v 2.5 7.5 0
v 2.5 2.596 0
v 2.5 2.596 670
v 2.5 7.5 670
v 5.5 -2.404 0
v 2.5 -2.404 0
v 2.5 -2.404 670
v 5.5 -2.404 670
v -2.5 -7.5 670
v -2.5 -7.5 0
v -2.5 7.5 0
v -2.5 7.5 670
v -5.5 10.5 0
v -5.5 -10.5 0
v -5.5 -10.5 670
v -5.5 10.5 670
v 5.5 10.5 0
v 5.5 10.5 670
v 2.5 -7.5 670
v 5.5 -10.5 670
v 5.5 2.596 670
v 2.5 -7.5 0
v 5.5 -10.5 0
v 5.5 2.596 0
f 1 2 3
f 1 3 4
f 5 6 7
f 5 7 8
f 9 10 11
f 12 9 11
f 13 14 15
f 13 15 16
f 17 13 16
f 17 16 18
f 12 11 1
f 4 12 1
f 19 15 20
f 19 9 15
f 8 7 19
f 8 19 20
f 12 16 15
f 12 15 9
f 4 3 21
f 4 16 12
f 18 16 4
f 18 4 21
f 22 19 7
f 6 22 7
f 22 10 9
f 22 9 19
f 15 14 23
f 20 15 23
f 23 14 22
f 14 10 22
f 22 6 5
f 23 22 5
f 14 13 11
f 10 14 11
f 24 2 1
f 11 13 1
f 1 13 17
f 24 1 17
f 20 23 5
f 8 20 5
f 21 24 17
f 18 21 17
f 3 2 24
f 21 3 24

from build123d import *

# Parameters (mm, degrees)
F0_W     = 11
F0_H     = 21
F1_DEPTH = 670
F2_W     = 5
F2_H     = 15
F3_DEPTH = 670
F4_W     = 10.772688
F4_H     = 2.595666
F4_H_2   = 2.404334
F5_DEPTH = 670


with BuildPart() as f1:
    # F0 (on Top) → F1 (new body)
    with BuildSketch(Plane.XY):
        Rectangle(F0_W, F0_H)
    extrude(amount=F1_DEPTH)

    # F2 (on face) → F3 (cut)
    with BuildSketch(Plane.XY.offset(670)):
        Rectangle(F2_W, F2_H)
    extrude(amount=-F3_DEPTH, mode=Mode.SUBTRACT)

    # F4 (on face) → F5 (cut)
    with BuildSketch(Plane.XY.offset(670)):
        with Locations((5.386344, 1.297833)):
            Rectangle(F4_W, F4_H)
        with Locations((5.386344, -1.202167)):
            Rectangle(F4_W, F4_H_2)
    extrude(amount=-F5_DEPTH, mode=Mode.SUBTRACT)


solid = f1.part
